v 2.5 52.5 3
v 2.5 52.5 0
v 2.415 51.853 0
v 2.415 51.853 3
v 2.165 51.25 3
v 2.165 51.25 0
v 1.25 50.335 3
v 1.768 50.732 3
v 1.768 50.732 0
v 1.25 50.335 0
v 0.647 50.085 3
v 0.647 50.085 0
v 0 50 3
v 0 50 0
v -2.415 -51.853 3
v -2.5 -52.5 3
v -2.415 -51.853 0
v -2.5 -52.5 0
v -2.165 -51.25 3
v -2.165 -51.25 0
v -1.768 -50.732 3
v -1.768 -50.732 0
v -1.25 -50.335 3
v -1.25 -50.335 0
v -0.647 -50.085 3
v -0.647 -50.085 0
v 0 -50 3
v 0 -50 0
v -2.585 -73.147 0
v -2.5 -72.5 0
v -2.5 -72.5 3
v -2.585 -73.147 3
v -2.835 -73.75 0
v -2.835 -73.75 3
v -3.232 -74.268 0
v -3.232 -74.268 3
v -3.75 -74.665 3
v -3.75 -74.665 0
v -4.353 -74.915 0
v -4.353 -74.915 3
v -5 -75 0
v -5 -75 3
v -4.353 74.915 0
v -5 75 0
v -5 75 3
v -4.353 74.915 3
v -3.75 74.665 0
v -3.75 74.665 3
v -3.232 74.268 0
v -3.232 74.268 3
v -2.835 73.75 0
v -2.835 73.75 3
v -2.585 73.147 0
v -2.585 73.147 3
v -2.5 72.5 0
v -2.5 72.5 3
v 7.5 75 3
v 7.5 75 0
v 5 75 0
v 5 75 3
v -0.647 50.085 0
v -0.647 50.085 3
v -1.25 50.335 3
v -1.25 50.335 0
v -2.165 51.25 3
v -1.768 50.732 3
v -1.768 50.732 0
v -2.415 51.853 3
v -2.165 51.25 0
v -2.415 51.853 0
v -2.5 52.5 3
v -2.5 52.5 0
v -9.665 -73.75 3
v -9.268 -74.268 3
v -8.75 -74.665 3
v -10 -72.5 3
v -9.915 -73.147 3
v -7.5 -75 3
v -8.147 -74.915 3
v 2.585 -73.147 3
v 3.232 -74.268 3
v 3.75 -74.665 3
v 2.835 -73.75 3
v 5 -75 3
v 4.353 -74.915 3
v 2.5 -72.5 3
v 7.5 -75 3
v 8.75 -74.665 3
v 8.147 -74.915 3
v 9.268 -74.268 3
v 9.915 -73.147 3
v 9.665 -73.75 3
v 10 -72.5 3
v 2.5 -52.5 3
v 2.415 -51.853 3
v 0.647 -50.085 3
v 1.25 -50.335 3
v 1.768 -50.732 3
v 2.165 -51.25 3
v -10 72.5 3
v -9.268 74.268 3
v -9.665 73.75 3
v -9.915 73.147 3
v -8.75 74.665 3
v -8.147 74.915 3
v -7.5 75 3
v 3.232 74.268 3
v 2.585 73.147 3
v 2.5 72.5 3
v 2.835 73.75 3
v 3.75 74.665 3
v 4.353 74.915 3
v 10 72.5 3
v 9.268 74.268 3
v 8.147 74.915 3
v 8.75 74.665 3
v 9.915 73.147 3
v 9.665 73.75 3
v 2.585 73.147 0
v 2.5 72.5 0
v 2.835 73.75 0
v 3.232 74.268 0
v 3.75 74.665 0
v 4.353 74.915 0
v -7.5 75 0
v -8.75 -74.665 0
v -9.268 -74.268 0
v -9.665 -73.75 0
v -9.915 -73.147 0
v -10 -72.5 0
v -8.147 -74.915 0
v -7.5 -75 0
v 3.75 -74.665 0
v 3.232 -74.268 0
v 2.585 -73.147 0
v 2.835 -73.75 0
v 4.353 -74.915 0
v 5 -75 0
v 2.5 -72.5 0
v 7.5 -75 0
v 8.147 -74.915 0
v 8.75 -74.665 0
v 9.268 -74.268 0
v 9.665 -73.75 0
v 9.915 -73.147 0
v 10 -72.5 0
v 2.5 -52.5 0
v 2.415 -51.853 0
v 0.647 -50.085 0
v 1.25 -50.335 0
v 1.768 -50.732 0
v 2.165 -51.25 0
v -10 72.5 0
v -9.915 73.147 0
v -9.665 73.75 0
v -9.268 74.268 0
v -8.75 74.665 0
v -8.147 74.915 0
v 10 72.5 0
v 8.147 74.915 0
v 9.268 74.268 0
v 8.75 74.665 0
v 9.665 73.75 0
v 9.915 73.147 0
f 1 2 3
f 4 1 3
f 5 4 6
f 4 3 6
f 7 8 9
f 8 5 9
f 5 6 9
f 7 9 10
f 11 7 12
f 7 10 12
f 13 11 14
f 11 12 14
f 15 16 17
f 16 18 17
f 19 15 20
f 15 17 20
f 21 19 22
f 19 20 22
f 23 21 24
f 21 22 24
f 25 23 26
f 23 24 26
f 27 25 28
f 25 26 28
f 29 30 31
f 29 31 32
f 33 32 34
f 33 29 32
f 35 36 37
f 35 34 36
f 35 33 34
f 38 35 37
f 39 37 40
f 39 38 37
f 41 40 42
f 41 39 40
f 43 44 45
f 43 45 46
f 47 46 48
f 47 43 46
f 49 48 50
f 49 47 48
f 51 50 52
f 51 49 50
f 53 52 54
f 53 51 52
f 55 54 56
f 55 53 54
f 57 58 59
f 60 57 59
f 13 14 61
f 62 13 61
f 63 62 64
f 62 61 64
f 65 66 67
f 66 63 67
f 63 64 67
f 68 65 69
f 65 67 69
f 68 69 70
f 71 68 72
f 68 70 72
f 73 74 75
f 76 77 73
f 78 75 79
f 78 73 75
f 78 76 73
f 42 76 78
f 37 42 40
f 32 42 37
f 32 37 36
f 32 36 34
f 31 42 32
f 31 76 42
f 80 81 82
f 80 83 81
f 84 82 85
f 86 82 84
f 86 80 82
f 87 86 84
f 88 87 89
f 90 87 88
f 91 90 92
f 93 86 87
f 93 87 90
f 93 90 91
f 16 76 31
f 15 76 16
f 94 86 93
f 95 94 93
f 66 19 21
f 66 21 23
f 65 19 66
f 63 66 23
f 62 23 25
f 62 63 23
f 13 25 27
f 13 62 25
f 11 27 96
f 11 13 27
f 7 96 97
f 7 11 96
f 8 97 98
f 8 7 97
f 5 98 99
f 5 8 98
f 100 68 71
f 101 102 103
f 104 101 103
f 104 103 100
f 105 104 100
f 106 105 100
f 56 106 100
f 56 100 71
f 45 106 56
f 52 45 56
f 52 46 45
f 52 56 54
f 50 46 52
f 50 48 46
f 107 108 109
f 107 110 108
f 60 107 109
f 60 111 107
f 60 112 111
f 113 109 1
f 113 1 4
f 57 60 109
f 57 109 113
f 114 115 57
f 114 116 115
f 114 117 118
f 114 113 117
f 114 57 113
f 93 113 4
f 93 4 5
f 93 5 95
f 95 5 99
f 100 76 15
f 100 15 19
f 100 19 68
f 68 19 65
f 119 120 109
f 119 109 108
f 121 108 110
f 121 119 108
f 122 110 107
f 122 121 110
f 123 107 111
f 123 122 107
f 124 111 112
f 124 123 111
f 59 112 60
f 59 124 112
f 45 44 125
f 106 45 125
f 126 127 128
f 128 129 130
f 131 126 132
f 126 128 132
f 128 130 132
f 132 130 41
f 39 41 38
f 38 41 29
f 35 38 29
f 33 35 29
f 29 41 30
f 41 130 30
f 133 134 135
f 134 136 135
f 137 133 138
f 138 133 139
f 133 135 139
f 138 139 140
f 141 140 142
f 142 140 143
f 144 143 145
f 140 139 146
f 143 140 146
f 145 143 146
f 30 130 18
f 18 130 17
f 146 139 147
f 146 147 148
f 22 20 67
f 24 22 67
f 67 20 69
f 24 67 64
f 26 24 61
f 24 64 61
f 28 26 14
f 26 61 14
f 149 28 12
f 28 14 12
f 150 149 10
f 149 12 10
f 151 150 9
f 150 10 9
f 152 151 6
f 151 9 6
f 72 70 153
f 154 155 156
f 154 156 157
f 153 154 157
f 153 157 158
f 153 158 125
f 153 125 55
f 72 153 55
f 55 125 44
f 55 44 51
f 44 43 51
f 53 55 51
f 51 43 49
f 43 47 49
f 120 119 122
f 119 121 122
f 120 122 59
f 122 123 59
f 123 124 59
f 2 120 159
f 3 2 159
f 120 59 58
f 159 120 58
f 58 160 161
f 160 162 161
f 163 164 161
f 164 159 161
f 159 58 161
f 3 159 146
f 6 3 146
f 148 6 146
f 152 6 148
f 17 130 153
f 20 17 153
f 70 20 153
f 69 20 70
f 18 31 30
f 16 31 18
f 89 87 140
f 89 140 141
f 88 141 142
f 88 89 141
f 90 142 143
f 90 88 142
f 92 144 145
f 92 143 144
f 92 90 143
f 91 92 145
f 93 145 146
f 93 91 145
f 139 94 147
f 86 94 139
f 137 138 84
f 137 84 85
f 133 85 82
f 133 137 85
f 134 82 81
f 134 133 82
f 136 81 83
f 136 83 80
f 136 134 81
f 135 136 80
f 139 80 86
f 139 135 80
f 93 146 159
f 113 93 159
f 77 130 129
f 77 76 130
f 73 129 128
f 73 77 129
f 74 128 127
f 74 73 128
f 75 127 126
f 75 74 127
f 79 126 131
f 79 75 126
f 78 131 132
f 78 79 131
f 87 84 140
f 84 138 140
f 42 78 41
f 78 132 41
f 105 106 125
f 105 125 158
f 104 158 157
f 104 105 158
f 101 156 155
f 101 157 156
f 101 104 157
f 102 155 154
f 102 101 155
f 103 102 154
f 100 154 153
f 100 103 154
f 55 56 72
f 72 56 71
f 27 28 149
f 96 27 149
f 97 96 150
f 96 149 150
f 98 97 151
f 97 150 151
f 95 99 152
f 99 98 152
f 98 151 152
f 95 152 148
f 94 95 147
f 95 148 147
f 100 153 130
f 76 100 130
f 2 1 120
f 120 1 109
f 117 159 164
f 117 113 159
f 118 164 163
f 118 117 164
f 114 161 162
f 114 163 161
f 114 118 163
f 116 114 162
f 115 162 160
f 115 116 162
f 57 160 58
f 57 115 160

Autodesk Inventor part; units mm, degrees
ref_plane "YZ Plane" through (0, 0, 0) normal (1, 0, 0) x (0, 1, 0)
ref_plane "XZ Plane" through (0, 0, 0) normal (0, 1, 0) x (-1, 0, 0)
ref_plane "XY Plane" through (0, 0, 0) normal (0, 0, 1) x (1, 0, 0)
sketch "Sketch1" plane through (0, 0, 0) normal (0, 0, 1) x (1, 0, 0)
  line L0 (-10, -75) -> (10, -75)
  line L1 (10, -75) -> (10, 75)
  line L2 (10, 75) -> (-10, 75)
  line L3 (-10, 75) -> (-10, -75)
  line L4 (-10, -75) -> (10, 75) construction
  line L5 (10, -75) -> (-10, 75) construction
  point P0 (0, 0)
  dimension "d0" = 20
  dimension "d1" = 150
extrude "Extrusion1" add sketch "Sketch1" along normal blind 3
sketch "Sketch2" plane through (0, 0, 3) normal (0, 0, 1) x (1, 0, 0)
  line L0 (0, -105) -> (0, 105) construction
  line L1 (-2.5, 50) -> (2.5, 50)
  line L2 (2.5, 50) -> (2.5, 75)
  line L3 (2.5, 75) -> (-2.5, 75)
  line L4 (-2.5, 75) -> (-2.5, 50)
  line L5 (-2.5, 50) -> (2.5, 75) construction
  line L6 (2.5, 50) -> (-2.5, 75) construction
  line L7 (10, 75) -> (-10, 75) construction
  line L8 (-14, 0) -> (14, 0) projected
  line L9 (-2.5, -50) -> (2.5, -50)
  line L10 (2.5, -50) -> (2.5, -75)
  line L11 (2.5, -75) -> (-2.5, -75)
  line L12 (-2.5, -75) -> (-2.5, -50)
  line L13 (-2.5, -50) -> (2.5, -75) construction
  line L14 (2.5, -50) -> (-2.5, -75) construction
  line L15 (10, -75) -> (-10, -75) construction
  point P0 (0, 0)
  point P1 (0, 62.5)
  point P2 (0, 75)
  point P3 (0, -62.5)
  point P4 (0, -75)
  dimension "d4" = 100
  dimension "d5" = 5
extrude "Extrusion2" cut sketch "Sketch2" against normal blind 3
fillet "Fillet1" radius 2.5 12 edges at (-2.5, 50, 1.5) (2.5, 50, 1.5) (-2.5, 75, 1.5) (2.5, 75, 1.5) (10, 75, 1.5) (-10, 75, 1.5) (10, -75, 1.5) (-10, -75, 1.5) (-2.5, -75, 1.5) (2.5, -75, 1.5) (-2.5, -50, 1.5) (2.5, -50, 1.5)
sketch "Sketch3" plane through (0, 0, 3) normal (0, 0, 1) x (1, 0, 0)
  arc A0 (2.5, -72.5) -> (5, -75) centre (5, -72.5) ccw projected
  line L0 (5, -75) -> (7.5, -75) projected
  arc A1 (7.5, -75) -> (10, -72.5) centre (7.5, -72.5) ccw projected
  line L1 (10, -72.5) -> (10, 72.5) projected
  arc A2 (10, 72.5) -> (7.5, 75) centre (7.5, 72.5) ccw projected
  line L2 (7.5, 75) -> (5, 75) projected
  arc A3 (5, 75) -> (2.5, 72.5) centre (5, 72.5) ccw projected
  line L3 (2.5, 72.5) -> (2.5, 52.5) projected
  arc A4 (-2.5, 52.5) -> (2.5, 52.5) centre (0, 52.5) ccw projected
  line L4 (-2.5, 52.5) -> (-2.5, 72.5) projected
  arc A5 (-2.5, 72.5) -> (-5, 75) centre (-5, 72.5) ccw projected
  line L5 (-5, 75) -> (-7.5, 75) projected
  arc A6 (-7.5, 75) -> (-10, 72.5) centre (-7.5, 72.5) ccw projected
  line L6 (-10, 72.5) -> (-10, -72.5) projected
  arc A7 (-10, -72.5) -> (-7.5, -75) centre (-7.5, -72.5) ccw projected
  line L7 (-7.5, -75) -> (-5, -75) projected
  arc A8 (-5, -75) -> (-2.5, -72.5) centre (-5, -72.5) ccw projected
  line L8 (-2.5, -72.5) -> (-2.5, -52.5) projected
  arc A9 (2.5, -52.5) -> (-2.5, -52.5) centre (0, -52.5) ccw projected
  line L9 (2.5, -52.5) -> (2.5, -72.5) projected
  point P0 (0, 0)
properties part number "LED_Glass"
